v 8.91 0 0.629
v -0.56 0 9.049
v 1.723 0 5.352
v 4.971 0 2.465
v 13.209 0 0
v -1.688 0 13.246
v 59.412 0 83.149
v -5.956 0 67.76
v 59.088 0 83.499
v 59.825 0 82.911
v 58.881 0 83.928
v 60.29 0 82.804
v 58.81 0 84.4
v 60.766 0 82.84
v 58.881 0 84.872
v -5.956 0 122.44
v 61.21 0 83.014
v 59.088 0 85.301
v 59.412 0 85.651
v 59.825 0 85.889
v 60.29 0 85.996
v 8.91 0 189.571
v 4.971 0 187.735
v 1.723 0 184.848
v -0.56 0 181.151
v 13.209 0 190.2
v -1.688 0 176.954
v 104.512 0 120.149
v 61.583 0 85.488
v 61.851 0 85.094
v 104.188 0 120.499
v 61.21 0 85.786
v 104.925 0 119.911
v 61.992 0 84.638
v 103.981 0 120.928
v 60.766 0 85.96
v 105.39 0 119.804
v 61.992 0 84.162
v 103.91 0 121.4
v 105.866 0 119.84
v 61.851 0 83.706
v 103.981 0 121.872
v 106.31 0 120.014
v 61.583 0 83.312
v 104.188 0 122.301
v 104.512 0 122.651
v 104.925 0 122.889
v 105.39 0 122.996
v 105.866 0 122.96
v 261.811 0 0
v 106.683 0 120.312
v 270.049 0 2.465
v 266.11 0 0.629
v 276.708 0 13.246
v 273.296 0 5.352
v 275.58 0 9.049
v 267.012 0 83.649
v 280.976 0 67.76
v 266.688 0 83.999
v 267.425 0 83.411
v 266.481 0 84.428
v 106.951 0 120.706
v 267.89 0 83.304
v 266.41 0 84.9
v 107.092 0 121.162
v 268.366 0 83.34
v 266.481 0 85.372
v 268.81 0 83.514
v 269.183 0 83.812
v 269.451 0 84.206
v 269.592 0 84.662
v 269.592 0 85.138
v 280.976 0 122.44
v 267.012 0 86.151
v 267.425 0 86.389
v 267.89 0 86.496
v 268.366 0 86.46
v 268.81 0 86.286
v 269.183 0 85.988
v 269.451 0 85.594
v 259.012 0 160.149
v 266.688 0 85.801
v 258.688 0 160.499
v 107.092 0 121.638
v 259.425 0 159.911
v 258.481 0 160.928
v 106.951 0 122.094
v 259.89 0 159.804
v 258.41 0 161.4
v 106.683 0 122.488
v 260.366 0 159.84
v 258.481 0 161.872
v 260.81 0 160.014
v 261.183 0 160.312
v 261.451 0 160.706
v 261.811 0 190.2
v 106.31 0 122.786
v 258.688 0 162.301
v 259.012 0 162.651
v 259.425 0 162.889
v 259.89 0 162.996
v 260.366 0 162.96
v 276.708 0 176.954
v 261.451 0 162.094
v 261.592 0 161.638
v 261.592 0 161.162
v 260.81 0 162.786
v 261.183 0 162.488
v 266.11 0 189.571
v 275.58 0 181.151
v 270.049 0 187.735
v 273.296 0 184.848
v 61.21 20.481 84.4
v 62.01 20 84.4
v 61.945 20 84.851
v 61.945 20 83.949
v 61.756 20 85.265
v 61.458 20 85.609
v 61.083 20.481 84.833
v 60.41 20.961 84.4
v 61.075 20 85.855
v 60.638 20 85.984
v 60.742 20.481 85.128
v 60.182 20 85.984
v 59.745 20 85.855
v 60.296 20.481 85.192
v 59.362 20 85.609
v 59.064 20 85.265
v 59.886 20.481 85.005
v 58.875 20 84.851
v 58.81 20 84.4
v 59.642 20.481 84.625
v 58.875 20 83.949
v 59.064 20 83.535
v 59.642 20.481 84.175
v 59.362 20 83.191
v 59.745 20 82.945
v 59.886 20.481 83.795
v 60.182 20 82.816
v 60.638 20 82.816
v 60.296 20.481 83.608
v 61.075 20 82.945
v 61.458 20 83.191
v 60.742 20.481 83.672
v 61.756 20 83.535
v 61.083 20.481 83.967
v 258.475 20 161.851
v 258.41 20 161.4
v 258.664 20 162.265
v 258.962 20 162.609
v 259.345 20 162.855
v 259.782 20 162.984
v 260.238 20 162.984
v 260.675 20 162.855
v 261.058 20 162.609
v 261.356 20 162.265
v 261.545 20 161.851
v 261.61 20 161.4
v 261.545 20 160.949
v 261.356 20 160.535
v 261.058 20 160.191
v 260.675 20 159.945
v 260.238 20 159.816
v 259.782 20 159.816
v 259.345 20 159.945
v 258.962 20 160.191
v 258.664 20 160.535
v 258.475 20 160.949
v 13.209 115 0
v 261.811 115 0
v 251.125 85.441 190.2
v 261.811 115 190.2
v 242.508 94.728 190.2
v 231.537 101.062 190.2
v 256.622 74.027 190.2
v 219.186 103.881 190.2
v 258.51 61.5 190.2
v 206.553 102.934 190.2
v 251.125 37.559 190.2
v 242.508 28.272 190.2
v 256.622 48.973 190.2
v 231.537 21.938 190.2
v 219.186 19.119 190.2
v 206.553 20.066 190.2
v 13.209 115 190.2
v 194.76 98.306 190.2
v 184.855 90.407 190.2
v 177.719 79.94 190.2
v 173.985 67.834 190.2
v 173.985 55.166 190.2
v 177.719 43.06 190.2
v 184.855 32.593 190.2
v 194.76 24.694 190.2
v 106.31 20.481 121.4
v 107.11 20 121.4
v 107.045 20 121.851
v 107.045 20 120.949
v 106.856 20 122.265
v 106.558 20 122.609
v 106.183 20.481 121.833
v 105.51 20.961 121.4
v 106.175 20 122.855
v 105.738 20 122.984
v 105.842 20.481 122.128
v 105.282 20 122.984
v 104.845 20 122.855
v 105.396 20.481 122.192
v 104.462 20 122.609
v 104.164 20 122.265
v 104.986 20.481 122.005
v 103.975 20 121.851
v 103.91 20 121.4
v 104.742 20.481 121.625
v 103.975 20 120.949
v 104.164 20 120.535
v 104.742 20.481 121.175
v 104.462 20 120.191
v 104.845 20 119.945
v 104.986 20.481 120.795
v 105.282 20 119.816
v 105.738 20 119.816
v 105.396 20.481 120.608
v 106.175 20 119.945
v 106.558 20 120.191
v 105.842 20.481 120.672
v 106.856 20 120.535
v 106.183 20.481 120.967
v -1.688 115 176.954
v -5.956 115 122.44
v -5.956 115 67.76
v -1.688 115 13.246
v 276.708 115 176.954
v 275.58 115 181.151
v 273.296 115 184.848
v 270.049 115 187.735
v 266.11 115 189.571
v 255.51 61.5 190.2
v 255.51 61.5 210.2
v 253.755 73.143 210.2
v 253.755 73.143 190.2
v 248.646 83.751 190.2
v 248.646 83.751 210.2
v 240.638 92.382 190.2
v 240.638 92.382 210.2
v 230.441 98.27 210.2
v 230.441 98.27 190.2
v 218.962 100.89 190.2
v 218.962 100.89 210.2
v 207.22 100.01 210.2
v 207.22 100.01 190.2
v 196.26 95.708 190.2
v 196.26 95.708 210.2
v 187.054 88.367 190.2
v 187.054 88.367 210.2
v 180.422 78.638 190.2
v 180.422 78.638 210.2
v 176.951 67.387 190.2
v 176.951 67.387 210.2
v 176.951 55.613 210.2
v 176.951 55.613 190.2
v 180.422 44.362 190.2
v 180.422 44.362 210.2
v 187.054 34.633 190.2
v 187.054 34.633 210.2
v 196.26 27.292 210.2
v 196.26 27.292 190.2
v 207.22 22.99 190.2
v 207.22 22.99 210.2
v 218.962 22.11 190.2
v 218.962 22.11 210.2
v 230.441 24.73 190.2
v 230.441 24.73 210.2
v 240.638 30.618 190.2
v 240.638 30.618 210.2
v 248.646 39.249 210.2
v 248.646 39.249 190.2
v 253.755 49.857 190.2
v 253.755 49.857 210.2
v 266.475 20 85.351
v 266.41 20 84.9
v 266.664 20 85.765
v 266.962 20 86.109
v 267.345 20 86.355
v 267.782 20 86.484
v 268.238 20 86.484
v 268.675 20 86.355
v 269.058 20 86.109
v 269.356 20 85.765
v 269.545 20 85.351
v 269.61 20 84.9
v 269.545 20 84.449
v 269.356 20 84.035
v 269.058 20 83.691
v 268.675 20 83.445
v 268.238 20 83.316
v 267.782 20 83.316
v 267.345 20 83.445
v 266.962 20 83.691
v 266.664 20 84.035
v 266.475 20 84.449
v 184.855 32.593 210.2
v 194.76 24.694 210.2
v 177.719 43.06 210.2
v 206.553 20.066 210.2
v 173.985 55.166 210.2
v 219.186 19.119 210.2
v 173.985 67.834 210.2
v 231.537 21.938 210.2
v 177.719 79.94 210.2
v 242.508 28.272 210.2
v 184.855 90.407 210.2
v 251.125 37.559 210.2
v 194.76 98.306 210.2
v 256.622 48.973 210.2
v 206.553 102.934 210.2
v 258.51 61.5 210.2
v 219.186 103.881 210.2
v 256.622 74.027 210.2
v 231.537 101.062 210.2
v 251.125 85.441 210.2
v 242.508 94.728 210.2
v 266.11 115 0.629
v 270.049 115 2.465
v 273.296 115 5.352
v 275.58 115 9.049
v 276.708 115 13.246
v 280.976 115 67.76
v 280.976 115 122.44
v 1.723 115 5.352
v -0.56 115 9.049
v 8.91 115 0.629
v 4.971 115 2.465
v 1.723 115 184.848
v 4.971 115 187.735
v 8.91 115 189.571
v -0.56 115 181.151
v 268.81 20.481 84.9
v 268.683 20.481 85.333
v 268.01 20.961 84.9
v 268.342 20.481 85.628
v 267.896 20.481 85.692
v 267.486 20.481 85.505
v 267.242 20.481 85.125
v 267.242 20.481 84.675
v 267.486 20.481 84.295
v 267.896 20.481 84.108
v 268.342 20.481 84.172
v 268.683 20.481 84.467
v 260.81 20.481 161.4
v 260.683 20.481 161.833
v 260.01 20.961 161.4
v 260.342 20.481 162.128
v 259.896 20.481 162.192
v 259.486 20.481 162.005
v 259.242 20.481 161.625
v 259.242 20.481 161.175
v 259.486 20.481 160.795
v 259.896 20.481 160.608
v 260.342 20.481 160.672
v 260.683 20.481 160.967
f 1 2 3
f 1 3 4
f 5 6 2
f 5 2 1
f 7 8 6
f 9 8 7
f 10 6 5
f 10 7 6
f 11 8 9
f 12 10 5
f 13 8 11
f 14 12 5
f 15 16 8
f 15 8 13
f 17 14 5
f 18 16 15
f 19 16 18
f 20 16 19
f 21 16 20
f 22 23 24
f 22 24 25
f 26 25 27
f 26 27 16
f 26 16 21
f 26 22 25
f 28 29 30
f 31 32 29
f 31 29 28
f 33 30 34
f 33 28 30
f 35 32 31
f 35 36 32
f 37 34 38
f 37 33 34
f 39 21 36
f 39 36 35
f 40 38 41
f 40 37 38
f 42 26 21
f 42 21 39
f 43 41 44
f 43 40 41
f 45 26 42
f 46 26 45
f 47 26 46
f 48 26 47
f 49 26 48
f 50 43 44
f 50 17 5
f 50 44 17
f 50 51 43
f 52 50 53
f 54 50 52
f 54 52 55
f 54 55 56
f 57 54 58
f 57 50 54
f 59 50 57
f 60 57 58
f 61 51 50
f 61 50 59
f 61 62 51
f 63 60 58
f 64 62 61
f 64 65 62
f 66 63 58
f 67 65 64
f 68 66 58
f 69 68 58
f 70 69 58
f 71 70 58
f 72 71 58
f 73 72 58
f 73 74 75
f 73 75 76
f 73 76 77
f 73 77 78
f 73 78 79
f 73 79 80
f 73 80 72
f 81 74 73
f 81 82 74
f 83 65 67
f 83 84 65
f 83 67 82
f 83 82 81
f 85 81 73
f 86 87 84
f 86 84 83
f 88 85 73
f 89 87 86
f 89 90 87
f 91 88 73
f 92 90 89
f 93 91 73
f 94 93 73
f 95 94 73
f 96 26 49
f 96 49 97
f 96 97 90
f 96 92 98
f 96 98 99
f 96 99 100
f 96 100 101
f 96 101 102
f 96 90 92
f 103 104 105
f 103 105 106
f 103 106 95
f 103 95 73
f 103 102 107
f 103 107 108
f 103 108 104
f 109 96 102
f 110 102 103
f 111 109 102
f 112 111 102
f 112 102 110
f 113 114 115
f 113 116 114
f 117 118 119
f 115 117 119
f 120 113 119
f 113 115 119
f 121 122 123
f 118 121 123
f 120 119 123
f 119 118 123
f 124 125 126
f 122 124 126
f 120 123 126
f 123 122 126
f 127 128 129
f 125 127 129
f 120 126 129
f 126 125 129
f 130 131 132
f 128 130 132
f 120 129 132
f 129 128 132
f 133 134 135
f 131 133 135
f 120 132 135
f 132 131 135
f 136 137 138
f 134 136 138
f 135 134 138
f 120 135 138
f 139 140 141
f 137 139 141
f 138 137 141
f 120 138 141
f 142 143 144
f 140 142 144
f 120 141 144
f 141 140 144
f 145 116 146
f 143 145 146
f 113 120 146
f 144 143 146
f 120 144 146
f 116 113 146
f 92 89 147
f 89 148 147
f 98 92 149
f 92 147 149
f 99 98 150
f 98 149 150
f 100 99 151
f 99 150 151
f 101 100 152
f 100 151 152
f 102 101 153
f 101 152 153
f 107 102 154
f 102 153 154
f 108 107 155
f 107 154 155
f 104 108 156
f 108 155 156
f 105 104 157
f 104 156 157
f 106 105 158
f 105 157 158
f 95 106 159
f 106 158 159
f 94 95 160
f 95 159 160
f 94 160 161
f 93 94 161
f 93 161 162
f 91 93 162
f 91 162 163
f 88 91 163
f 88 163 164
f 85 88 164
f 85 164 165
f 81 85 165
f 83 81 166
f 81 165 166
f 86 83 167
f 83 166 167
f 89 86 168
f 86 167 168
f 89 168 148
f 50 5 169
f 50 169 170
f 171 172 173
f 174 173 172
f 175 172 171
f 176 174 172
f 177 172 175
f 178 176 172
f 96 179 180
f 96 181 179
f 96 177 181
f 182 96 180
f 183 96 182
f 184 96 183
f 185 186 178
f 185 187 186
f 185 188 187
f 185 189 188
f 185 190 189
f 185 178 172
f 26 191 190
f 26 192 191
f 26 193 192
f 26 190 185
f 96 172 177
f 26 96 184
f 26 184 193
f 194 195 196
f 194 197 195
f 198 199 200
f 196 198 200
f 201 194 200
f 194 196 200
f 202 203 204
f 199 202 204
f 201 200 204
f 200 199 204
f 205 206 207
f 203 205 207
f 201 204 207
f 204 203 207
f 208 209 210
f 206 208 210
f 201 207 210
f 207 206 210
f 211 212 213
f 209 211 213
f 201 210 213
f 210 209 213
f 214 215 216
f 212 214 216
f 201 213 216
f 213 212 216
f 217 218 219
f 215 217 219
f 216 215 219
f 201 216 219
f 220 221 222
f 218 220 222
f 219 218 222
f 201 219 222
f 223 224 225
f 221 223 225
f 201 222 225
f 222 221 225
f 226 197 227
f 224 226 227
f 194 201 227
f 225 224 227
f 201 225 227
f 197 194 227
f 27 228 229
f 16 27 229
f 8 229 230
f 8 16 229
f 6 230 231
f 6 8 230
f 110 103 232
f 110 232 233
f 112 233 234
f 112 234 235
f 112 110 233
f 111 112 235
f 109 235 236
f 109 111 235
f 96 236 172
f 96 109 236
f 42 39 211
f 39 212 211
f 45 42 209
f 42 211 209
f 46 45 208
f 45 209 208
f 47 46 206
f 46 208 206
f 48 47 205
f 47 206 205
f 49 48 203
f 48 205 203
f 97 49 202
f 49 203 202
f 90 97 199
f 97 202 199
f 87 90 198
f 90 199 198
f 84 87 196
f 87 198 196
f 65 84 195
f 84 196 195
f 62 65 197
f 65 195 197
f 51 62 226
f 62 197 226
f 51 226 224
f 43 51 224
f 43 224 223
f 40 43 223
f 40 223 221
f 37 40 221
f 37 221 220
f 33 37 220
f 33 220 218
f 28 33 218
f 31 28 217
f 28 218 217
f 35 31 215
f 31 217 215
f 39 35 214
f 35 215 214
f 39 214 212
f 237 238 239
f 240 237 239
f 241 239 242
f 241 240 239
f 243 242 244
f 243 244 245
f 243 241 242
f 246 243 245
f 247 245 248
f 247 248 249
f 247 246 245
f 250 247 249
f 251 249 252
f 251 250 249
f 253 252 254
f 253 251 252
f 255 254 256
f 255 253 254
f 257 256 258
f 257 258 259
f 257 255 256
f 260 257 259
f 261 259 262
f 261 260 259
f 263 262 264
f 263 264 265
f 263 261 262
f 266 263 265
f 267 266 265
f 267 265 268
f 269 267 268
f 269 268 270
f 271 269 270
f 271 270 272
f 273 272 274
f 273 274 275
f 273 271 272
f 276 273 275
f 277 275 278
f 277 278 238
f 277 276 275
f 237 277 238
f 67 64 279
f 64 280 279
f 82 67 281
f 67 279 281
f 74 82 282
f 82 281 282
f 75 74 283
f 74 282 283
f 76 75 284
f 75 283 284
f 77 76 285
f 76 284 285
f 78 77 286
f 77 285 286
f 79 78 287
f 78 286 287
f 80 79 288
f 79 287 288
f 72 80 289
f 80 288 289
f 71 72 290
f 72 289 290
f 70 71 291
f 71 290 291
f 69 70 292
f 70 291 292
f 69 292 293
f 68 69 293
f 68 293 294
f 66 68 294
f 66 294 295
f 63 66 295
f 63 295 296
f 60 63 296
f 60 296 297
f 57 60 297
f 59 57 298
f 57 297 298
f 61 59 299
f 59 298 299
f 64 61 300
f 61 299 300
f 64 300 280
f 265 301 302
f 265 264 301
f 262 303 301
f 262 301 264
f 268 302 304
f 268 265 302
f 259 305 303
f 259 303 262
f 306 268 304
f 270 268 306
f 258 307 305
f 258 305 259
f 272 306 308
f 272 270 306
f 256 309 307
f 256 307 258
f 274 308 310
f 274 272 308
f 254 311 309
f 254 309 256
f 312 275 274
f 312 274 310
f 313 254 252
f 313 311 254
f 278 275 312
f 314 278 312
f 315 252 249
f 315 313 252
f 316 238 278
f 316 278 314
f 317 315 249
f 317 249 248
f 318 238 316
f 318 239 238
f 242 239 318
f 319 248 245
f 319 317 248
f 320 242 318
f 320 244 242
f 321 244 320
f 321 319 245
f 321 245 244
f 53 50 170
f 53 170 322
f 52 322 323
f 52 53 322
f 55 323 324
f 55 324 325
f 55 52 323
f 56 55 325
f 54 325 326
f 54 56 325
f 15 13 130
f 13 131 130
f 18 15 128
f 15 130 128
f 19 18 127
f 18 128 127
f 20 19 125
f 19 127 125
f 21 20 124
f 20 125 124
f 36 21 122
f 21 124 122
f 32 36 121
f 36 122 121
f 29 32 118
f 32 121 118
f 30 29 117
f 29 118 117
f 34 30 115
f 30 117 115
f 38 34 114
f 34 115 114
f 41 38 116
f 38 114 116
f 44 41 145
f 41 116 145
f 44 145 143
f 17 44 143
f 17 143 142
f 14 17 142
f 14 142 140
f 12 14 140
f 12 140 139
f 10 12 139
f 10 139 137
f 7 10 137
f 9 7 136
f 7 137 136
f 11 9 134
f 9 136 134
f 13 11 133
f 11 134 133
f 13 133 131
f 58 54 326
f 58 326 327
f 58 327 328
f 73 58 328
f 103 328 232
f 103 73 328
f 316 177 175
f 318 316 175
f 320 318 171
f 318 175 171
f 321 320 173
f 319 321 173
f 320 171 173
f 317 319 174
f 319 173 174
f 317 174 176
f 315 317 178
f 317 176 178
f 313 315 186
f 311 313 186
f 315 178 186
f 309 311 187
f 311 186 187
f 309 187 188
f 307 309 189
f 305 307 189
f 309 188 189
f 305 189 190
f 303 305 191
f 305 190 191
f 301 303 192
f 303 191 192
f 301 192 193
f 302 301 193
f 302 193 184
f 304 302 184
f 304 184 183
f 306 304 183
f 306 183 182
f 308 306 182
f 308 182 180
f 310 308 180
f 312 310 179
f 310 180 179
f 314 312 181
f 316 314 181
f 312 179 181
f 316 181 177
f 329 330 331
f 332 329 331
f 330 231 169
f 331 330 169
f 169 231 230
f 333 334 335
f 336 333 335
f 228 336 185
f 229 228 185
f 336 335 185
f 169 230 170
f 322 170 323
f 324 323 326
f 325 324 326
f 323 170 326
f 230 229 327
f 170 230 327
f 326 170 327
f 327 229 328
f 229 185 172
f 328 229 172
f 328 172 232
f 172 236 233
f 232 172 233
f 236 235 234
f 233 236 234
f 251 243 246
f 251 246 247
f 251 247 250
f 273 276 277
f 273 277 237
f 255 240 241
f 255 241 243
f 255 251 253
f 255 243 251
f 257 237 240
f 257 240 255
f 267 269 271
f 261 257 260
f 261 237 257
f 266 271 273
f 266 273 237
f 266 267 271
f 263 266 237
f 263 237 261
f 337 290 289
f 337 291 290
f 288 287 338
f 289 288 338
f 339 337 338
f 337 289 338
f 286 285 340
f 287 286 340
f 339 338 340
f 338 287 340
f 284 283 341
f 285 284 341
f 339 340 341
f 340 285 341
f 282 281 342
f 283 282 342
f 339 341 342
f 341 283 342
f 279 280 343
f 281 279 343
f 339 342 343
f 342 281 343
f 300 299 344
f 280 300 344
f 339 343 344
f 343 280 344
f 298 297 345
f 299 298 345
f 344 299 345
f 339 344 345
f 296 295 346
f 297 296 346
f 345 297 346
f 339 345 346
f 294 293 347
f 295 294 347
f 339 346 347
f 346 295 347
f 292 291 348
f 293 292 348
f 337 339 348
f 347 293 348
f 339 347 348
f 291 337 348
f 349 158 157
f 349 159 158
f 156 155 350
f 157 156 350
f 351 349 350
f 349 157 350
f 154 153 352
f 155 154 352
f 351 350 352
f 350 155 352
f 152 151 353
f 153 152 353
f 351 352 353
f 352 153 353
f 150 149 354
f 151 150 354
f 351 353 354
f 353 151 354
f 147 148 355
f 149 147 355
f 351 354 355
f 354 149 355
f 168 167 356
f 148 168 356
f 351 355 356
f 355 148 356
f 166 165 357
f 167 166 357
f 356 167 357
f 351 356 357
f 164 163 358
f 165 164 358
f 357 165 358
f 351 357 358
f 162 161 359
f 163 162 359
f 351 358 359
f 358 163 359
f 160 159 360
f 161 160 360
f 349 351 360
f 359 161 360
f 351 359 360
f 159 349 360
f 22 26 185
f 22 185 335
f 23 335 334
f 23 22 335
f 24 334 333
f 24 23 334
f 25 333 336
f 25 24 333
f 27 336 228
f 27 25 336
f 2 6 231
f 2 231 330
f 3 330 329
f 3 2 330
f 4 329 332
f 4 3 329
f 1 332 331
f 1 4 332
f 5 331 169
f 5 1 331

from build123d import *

# Parameters (mm, degrees)
F1_DEPTH = 115
F2_D     = 3.2
F2_DEPTH = 20
F2_TIP   = 0.9613769904
F3_R     = 42.5
F3_R_2   = 39.5
F4_DEPTH = 20


with BuildPart() as f1:
    # F0 (on Front) → F1 (new body)
    with BuildSketch(Plane.XZ):
        with BuildLine():
            ThreePointArc((-1.6878500476, 13.2459854015), (3.2420540262, 3.7904010112), (13.2092447292, 0))
            Line((13.2092447292, 0), (261.8105676743, 0))
            ThreePointArc((261.8105676743, 0), (271.7777583774, 3.7904010112), (276.7076624511, 13.2459854015))
            ThreePointArc((276.7076624511, 13.2459854015), (281.5099062018, 95.1), (276.7076624511, 176.9540145985))
            ThreePointArc((276.7076624511, 176.9540145985), (271.7777583774, 186.4095989888), (261.8105676743, 190.2))
            Line((261.8105676743, 190.2), (13.2092447292, 190.2))
            ThreePointArc((13.2092447292, 190.2), (3.2420540262, 186.4095989888), (-1.6878500476, 176.9540145985))
            ThreePointArc((-1.6878500476, 176.9540145985), (-6.4900937982, 95.1), (-1.6878500476, 13.2459854015))
        make_face()
    extrude(amount=-F1_DEPTH)

    # F2
    with Locations(Plane.XZ):
        with Locations((60.4099062018, 84.4), (105.5099062018, 121.4), (268.0099062018, 84.9), (260.0099062018, 161.4)):
            Hole(F2_D / 2, depth=F2_DEPTH)
            with Locations((0, 0, -(F2_DEPTH + F2_TIP / 2))):  # 118° drill point
                Cone(0, F2_D / 2, F2_TIP, mode=Mode.SUBTRACT)

    # F3 (on face) → F4 (join)
    with BuildSketch(Plane.XY.offset(190.2)):
        with Locations((216.0099062018, 61.5)):
            Circle(F3_R)
        with Locations((216.0099062018, 61.5)):
            Circle(F3_R_2, mode=Mode.SUBTRACT)
    extrude(amount=F4_DEPTH)


solid = f1.part
